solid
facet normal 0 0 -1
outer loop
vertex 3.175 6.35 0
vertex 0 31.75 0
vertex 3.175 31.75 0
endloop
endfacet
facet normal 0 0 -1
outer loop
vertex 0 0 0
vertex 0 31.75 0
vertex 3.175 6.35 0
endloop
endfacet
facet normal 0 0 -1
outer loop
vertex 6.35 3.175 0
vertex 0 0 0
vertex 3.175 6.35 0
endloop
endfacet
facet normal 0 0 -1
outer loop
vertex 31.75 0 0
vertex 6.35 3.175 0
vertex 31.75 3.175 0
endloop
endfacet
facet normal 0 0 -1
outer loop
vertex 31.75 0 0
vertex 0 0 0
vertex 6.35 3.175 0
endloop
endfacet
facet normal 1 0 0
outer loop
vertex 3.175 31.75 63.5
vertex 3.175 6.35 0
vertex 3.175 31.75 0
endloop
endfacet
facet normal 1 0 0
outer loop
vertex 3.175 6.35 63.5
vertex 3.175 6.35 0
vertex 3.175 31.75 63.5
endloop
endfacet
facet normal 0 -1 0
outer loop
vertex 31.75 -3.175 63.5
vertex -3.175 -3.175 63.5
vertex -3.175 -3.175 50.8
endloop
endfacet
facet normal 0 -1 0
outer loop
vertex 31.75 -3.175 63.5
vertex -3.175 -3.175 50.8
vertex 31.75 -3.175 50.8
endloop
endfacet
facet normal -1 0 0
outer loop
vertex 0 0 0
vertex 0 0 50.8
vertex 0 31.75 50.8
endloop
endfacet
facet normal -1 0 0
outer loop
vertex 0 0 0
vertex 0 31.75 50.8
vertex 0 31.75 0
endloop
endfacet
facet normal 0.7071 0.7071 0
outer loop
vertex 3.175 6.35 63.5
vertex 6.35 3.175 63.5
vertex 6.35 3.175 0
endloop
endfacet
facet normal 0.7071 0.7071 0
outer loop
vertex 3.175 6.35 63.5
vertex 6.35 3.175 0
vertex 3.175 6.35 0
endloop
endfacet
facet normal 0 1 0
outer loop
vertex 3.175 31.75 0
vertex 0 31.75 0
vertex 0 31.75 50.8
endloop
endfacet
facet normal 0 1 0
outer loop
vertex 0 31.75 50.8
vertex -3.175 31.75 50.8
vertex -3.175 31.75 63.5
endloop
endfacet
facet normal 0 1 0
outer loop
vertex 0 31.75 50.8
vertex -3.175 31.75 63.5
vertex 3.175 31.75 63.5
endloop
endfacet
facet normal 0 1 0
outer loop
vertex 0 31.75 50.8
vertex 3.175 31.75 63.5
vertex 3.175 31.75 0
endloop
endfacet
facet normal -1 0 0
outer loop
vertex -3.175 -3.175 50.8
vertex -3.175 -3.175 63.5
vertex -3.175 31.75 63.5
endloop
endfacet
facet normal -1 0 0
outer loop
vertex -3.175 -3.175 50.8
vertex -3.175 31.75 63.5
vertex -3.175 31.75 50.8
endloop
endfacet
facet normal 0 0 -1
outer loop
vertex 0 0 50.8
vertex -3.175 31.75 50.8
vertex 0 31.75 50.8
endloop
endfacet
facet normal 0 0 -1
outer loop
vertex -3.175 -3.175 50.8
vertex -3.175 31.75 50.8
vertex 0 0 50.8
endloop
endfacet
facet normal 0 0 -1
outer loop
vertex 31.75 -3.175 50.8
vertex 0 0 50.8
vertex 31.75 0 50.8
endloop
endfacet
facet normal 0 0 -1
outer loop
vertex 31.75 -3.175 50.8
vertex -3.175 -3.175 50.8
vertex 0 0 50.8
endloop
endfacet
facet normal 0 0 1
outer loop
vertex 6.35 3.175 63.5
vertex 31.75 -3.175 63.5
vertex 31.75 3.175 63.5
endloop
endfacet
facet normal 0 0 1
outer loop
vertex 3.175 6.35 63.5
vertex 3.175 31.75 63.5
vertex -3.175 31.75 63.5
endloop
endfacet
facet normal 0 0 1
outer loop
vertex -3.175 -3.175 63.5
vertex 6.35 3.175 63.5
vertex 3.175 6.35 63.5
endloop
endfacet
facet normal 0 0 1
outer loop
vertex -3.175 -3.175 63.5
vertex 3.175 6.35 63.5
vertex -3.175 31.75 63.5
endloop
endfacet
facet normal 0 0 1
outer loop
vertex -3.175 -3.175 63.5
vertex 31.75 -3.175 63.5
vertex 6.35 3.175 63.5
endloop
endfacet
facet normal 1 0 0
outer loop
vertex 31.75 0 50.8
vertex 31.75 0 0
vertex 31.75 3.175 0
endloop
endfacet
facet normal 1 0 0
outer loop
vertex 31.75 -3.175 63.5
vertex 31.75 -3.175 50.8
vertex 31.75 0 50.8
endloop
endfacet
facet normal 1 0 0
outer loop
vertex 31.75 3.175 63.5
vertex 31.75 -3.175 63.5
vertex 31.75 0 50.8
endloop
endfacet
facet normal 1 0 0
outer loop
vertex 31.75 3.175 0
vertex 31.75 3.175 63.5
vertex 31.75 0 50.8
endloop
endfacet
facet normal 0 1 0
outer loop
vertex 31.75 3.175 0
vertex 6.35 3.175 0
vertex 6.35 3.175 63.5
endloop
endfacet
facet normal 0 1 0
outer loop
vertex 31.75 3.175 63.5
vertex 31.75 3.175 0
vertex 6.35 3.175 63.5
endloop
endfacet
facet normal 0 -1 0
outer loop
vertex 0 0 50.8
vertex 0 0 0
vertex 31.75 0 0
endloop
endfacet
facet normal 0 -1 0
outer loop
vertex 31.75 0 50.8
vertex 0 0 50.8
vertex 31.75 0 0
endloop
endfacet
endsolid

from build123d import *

# Parameters (mm, degrees)
F1_DEPTH = 63.5
F3_DEPTH = 12.7
F5_DEPTH = 31.75


# Not quite as in the source:
# - a pattern or mirror of a feature is missing from the dataset's text; its kind, count and spacing are read off the source's solid


with BuildPart() as f1:
    # F0 (on Top) → F1 (new body)
    with BuildSketch(Plane.XY):
        Polygon((0, 9.525), (0, 0), (9.525, 0), align=None)
    extrude(amount=F1_DEPTH)

    # F2 (on face) → F3 (join)
    with BuildSketch(Plane.XY.offset(63.5)):
        Polygon((12.7, -3.175), (4.7625, 4.7625), (-3.175, 12.7), (-3.175, -3.175), align=None)
    extrude(amount=-F3_DEPTH)

    # F4 (on face) → F5 (join)
    with BuildSketch(Plane.XZ):
        Polygon((0, 50.8), (0, 0), (3.175, 0), (3.175, 63.5), (-3.175, 63.5), (-3.175, 50.8), align=None)
    f5 = extrude(amount=-F5_DEPTH)

    # F5_copies: F5 across plane
    add(f5.mirror(Plane(origin=(0, 0, 0), x_dir=(-0.7071067812, -0.7071067812, 0), z_dir=(0.7071067812, -0.7071067812, 0))))


solid = f1.part
